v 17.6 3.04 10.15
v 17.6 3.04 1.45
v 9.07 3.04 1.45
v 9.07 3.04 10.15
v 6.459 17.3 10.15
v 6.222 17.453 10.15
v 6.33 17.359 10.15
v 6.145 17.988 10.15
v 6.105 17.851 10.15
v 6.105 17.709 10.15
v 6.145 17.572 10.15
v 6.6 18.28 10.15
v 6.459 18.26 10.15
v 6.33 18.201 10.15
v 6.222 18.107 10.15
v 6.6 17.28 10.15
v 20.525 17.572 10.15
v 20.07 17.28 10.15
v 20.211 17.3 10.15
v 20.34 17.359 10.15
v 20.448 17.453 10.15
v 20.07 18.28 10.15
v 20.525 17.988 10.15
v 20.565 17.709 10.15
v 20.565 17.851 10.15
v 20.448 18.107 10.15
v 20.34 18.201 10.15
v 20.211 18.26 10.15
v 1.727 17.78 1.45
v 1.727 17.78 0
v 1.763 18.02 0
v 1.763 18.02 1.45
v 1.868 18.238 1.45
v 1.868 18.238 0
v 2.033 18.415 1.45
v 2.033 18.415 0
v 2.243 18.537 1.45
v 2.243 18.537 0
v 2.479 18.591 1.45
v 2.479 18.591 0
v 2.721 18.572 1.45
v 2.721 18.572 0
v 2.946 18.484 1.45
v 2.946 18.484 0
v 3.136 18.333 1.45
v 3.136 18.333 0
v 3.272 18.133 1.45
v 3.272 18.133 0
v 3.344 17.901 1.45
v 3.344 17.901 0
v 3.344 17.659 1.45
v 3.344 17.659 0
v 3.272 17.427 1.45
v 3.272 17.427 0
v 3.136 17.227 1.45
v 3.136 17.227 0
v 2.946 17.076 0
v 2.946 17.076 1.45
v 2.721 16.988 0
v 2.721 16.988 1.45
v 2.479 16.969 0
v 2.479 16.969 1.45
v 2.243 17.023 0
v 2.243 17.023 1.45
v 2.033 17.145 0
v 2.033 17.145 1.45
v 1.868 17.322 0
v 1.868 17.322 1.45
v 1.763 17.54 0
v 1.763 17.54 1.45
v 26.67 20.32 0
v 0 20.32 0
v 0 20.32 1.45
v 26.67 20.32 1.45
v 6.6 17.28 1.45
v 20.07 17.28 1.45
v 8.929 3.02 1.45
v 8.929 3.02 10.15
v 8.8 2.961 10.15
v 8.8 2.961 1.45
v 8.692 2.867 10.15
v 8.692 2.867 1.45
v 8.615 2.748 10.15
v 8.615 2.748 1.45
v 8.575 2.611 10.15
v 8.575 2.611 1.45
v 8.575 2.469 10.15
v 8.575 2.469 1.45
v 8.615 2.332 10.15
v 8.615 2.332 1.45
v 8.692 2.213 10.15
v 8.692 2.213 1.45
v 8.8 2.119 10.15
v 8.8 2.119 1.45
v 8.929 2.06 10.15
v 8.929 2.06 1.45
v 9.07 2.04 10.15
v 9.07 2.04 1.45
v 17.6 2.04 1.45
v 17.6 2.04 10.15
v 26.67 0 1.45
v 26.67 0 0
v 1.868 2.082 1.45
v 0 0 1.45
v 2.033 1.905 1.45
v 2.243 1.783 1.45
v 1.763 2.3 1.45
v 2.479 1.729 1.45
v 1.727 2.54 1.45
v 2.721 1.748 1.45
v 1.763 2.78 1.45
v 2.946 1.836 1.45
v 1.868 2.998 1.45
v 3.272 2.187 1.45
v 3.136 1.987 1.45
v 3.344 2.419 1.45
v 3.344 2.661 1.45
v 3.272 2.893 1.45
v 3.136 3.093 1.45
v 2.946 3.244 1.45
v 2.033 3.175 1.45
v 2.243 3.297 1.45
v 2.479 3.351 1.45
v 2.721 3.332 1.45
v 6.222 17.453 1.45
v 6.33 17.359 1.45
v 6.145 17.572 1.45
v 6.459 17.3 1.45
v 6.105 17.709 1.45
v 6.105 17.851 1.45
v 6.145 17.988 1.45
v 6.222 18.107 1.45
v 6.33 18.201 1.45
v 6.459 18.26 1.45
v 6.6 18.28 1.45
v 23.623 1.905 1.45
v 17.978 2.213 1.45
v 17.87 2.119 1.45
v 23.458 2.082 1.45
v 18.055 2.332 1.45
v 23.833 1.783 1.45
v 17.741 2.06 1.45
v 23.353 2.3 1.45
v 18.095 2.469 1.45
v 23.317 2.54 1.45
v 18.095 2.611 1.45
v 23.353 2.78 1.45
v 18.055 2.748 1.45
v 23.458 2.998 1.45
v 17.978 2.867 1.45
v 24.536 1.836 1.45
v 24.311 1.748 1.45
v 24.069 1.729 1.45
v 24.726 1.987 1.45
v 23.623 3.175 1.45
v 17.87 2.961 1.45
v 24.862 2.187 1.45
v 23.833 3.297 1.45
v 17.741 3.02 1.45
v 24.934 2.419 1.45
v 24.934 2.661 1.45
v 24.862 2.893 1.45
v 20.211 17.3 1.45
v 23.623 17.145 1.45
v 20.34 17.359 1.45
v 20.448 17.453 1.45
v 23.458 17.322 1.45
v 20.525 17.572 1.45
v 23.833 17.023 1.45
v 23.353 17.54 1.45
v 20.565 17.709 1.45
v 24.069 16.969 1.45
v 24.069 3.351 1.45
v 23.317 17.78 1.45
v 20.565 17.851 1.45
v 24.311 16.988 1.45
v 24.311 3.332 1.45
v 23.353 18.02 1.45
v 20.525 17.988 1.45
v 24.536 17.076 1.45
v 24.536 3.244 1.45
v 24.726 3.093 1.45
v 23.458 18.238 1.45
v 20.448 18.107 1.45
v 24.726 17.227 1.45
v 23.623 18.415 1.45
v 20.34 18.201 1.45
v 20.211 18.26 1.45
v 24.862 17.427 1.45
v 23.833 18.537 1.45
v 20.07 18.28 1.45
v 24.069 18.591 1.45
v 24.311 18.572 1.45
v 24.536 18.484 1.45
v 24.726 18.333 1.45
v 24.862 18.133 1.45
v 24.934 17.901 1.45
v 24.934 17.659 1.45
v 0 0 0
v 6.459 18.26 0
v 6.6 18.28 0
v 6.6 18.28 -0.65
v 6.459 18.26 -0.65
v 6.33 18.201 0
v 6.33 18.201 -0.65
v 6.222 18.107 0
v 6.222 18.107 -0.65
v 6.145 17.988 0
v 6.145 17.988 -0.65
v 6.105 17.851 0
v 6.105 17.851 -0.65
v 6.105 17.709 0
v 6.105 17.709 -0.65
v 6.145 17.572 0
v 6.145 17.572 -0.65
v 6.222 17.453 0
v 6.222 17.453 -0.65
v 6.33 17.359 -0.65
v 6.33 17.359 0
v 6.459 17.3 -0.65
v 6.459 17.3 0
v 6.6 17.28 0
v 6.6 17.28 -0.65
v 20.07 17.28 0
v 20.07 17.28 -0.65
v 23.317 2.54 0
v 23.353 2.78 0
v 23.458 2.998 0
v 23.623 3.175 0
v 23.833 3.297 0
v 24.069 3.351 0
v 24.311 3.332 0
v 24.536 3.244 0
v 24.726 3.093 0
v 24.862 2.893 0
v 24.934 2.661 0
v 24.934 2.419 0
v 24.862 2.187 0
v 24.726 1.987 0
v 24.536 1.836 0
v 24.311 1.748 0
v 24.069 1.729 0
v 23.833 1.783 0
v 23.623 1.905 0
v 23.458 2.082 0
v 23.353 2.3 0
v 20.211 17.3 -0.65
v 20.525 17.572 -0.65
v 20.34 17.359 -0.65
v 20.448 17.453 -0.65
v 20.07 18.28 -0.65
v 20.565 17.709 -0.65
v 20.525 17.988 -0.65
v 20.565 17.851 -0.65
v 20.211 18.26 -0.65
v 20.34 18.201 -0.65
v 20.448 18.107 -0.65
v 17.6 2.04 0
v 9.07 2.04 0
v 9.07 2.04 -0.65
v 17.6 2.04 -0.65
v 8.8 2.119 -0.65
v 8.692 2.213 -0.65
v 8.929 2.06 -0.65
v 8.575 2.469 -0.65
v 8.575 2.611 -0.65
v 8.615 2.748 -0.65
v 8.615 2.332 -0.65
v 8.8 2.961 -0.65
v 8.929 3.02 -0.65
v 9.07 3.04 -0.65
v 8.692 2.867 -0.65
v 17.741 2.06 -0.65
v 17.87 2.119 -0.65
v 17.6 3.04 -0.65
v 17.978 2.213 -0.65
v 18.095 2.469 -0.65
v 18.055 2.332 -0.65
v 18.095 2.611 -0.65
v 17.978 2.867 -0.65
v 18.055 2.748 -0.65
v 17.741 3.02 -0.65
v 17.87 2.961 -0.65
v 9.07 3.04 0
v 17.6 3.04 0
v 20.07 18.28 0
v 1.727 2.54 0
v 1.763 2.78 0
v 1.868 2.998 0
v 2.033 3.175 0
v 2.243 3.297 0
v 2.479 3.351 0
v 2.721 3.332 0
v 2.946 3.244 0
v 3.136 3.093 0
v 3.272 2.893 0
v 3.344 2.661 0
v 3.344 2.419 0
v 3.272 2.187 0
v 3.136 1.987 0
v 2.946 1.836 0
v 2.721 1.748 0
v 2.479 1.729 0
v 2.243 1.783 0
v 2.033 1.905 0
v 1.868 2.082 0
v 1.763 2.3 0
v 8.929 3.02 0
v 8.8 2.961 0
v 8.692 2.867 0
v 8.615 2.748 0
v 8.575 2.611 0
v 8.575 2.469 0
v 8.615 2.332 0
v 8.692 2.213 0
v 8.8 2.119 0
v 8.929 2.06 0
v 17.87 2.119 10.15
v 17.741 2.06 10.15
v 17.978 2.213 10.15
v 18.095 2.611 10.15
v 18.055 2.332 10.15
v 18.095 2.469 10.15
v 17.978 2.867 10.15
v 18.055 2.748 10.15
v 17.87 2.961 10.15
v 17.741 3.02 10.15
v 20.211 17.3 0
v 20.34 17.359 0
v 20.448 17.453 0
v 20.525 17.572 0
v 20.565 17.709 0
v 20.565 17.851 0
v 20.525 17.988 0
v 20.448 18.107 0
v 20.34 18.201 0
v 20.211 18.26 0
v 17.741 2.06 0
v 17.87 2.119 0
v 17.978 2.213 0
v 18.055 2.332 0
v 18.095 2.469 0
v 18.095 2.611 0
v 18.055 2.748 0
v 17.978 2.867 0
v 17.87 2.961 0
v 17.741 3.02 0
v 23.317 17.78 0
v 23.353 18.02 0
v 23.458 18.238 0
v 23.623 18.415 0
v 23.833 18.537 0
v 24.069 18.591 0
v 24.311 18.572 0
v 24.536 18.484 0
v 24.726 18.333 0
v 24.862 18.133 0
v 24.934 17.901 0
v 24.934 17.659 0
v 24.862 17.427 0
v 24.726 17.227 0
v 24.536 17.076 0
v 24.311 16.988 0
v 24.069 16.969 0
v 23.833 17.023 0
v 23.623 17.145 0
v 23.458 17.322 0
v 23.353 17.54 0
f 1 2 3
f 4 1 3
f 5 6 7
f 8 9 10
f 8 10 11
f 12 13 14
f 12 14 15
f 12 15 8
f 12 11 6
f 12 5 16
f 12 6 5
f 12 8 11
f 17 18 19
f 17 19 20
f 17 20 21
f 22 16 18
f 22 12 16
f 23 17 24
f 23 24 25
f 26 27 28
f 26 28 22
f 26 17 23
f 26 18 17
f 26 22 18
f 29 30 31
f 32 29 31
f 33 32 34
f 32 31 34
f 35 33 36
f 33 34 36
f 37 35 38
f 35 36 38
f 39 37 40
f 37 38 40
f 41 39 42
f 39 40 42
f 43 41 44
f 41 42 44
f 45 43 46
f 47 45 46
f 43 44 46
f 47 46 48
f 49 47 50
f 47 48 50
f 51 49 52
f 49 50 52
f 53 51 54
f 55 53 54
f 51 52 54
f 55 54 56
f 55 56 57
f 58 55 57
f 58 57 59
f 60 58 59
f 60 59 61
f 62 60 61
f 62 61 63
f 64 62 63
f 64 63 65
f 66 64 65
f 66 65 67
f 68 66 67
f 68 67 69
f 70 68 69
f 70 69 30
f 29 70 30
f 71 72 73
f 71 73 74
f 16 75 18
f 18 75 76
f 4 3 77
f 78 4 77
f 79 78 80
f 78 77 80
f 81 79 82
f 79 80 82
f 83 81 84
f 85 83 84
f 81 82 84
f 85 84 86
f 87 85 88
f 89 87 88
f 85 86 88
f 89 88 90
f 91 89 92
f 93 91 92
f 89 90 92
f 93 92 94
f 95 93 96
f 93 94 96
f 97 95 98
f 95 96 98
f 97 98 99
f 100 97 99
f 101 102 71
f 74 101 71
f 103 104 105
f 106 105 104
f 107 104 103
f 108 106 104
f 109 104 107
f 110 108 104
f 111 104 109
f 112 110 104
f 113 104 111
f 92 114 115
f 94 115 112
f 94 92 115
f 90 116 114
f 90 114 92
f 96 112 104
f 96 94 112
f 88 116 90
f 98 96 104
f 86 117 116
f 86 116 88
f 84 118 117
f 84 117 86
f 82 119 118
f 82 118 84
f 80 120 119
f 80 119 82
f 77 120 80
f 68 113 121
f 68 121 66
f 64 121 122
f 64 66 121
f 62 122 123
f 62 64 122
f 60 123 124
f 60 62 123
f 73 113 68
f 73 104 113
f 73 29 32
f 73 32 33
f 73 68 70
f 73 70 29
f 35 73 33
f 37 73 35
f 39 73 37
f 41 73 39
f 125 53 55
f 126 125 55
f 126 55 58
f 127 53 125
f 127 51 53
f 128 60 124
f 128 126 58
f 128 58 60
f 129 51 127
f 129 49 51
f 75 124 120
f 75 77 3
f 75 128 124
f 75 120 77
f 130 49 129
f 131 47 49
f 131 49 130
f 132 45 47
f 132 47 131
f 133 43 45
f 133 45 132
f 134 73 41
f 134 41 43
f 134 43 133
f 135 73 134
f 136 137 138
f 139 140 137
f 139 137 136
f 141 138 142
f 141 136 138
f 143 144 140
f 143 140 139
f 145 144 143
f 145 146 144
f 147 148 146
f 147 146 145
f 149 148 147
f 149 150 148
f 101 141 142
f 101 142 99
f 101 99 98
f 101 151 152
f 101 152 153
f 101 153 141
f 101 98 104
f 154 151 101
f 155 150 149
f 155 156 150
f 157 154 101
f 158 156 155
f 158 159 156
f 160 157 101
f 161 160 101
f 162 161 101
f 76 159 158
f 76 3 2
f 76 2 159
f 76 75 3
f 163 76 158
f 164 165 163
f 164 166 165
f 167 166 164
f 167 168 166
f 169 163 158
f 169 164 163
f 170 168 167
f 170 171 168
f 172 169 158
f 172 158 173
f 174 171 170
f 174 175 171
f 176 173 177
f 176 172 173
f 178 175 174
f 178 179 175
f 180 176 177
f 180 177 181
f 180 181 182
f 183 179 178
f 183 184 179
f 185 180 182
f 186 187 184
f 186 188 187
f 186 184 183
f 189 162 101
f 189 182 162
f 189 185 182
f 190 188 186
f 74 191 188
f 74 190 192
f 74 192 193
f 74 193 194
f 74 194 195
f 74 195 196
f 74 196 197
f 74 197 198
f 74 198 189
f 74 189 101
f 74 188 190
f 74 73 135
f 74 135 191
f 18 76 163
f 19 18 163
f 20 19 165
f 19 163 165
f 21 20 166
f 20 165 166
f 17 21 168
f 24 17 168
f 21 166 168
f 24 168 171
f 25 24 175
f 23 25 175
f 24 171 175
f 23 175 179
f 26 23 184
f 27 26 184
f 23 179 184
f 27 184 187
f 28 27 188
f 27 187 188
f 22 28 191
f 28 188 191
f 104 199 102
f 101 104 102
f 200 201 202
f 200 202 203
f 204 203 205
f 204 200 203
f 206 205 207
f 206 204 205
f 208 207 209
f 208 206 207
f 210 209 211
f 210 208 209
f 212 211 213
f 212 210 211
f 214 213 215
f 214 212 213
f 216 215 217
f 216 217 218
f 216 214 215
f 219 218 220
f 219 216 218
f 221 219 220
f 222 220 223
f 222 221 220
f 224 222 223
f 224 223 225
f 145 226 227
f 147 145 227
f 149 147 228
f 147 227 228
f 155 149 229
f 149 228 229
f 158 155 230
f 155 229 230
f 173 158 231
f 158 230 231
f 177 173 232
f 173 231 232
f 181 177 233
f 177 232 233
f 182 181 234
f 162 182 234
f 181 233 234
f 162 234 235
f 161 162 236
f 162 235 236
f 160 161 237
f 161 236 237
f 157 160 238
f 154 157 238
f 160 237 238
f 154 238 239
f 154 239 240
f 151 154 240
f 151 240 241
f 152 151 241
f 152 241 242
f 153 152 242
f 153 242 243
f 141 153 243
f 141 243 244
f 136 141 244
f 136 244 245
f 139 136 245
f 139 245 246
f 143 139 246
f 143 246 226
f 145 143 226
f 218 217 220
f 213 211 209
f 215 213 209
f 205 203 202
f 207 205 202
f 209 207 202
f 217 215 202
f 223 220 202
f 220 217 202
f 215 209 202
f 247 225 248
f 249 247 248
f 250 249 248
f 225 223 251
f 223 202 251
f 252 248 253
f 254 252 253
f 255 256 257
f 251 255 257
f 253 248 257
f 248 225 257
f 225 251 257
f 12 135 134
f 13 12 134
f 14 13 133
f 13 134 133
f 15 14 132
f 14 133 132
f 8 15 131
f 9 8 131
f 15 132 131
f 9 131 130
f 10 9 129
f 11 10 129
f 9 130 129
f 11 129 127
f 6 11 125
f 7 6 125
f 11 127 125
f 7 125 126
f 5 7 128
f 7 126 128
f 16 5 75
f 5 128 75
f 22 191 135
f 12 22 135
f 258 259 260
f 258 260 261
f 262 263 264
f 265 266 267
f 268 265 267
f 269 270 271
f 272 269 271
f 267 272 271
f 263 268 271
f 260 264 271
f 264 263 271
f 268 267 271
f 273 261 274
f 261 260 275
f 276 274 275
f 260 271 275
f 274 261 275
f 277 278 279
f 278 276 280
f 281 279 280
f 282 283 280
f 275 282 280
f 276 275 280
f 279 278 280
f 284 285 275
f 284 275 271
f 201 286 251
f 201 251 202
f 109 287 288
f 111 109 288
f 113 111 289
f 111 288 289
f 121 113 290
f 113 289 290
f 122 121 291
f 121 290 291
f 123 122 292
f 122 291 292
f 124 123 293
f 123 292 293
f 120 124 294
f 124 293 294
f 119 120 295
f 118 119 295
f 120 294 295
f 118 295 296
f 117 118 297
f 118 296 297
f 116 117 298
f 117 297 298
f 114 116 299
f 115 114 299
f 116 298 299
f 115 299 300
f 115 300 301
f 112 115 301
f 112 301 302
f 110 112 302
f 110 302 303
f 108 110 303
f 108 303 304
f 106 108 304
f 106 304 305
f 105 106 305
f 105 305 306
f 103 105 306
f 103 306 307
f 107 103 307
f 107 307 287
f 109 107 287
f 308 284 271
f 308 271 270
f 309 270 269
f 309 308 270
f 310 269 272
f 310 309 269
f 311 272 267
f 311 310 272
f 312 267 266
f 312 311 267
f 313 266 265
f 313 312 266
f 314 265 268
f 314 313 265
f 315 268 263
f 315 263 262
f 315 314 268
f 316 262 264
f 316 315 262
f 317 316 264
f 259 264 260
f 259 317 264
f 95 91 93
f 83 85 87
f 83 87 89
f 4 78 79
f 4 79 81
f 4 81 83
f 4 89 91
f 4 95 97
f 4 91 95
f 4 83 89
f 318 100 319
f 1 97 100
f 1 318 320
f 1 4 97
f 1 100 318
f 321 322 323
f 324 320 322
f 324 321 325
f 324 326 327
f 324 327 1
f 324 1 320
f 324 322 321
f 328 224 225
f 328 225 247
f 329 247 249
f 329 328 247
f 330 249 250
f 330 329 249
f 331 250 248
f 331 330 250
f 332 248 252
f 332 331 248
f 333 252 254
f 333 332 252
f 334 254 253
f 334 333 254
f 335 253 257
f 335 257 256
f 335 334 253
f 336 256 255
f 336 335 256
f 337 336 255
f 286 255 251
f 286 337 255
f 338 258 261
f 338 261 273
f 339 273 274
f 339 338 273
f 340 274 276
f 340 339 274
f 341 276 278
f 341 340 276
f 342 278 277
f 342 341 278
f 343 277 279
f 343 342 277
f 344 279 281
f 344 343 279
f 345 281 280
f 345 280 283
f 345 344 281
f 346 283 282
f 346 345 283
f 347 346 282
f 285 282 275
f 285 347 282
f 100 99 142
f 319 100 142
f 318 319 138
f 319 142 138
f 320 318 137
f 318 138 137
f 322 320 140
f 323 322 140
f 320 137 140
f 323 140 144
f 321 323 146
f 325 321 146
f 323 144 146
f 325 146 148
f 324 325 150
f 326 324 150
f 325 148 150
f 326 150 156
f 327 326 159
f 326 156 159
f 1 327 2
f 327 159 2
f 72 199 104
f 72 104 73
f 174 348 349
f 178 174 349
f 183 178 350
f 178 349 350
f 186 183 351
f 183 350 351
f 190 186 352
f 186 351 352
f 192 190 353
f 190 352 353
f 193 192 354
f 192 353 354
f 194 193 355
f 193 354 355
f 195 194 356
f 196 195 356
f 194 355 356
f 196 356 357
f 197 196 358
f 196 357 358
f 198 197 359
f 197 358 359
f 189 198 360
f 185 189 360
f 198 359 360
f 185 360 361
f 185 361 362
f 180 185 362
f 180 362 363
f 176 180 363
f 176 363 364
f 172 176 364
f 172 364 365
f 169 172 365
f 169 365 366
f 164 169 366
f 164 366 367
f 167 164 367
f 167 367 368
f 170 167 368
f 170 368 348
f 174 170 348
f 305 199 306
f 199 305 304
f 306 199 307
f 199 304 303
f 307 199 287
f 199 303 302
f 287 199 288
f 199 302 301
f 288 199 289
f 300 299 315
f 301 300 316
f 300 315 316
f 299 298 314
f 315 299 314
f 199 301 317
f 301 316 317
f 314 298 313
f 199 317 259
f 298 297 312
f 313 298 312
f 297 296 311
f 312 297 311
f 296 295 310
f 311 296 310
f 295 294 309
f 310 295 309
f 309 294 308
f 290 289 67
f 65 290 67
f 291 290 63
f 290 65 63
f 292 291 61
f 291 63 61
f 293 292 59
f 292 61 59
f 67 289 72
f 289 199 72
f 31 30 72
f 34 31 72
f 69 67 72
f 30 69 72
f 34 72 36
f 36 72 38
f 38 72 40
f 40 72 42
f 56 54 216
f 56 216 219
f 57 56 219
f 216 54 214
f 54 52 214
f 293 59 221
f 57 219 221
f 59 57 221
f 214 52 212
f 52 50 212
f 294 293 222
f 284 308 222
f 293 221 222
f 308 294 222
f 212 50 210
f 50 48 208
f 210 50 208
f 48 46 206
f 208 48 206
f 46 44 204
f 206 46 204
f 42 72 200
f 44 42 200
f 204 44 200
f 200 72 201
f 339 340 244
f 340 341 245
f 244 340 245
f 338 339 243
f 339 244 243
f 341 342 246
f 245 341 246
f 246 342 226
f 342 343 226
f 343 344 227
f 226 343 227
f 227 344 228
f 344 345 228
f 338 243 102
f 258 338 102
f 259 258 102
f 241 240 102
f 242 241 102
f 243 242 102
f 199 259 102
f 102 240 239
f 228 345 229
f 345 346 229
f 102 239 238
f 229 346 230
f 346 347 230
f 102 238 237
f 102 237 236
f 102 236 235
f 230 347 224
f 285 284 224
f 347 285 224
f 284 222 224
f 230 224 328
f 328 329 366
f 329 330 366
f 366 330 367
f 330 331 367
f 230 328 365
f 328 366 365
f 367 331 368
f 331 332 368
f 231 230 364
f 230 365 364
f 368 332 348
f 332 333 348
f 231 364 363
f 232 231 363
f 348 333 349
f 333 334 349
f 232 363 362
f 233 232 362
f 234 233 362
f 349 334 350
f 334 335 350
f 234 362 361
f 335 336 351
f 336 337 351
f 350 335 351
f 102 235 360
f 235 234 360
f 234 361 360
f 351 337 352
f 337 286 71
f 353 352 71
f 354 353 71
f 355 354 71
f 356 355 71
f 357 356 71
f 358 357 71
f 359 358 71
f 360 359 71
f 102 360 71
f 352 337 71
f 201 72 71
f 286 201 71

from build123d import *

# Parameters (mm, degrees)
F0_W     = 26.67
F0_H     = 20.32
F1_DEPTH = 1.45
F3_D     = 1.6256
F5_DEPTH = 8.7
F6_DEPTH = 2.1


with BuildPart() as f1:
    # F0 (on Top) → F1 (new body)
    with BuildSketch(Plane.XY):
        with Locations((13.335, 10.16)):
            Rectangle(F0_W, F0_H)
    extrude(amount=F1_DEPTH)

    # F3 (through all)
    with Locations(Plane.XY.offset(1.45)):
        with Locations((2.54, 17.78), (2.54, 2.54), (24.13, 2.54), (24.13, 17.78)):
            Hole(F3_D / 2)

    # F4 (on face) → F5 (join)
    with BuildSketch(Plane.XY.offset(1.45)):
        with BuildLine():
            Line((20.07, 18.28), (6.6, 18.28))
            ThreePointArc((6.6, 18.28), (6.1, 17.78), (6.6, 17.28))
            Line((6.6, 17.28), (20.07, 17.28))
            ThreePointArc((20.07, 17.28), (20.57, 17.78), (20.07, 18.28))
        make_face()
        with BuildLine():
            Line((17.6, 3.04), (9.07, 3.04))
            ThreePointArc((9.07, 3.04), (8.57, 2.54), (9.07, 2.04))
            Line((9.07, 2.04), (17.6, 2.04))
            ThreePointArc((17.6, 2.04), (18.1, 2.54), (17.6, 3.04))
        make_face()
    extrude(amount=F5_DEPTH)

    # F4 (on face) → F6 (join)
    with BuildSketch(Plane.XY.offset(1.45)):
        with BuildLine():
            Line((20.07, 18.28), (6.6, 18.28))
            ThreePointArc((6.6, 18.28), (6.1, 17.78), (6.6, 17.28))
            Line((6.6, 17.28), (20.07, 17.28))
            ThreePointArc((20.07, 17.28), (20.57, 17.78), (20.07, 18.28))
        make_face()
        with BuildLine():
            Line((17.6, 3.04), (9.07, 3.04))
            ThreePointArc((9.07, 3.04), (8.57, 2.54), (9.07, 2.04))
            Line((9.07, 2.04), (17.6, 2.04))
            ThreePointArc((17.6, 2.04), (18.1, 2.54), (17.6, 3.04))
        make_face()
    extrude(amount=-F6_DEPTH)


solid = f1.part
